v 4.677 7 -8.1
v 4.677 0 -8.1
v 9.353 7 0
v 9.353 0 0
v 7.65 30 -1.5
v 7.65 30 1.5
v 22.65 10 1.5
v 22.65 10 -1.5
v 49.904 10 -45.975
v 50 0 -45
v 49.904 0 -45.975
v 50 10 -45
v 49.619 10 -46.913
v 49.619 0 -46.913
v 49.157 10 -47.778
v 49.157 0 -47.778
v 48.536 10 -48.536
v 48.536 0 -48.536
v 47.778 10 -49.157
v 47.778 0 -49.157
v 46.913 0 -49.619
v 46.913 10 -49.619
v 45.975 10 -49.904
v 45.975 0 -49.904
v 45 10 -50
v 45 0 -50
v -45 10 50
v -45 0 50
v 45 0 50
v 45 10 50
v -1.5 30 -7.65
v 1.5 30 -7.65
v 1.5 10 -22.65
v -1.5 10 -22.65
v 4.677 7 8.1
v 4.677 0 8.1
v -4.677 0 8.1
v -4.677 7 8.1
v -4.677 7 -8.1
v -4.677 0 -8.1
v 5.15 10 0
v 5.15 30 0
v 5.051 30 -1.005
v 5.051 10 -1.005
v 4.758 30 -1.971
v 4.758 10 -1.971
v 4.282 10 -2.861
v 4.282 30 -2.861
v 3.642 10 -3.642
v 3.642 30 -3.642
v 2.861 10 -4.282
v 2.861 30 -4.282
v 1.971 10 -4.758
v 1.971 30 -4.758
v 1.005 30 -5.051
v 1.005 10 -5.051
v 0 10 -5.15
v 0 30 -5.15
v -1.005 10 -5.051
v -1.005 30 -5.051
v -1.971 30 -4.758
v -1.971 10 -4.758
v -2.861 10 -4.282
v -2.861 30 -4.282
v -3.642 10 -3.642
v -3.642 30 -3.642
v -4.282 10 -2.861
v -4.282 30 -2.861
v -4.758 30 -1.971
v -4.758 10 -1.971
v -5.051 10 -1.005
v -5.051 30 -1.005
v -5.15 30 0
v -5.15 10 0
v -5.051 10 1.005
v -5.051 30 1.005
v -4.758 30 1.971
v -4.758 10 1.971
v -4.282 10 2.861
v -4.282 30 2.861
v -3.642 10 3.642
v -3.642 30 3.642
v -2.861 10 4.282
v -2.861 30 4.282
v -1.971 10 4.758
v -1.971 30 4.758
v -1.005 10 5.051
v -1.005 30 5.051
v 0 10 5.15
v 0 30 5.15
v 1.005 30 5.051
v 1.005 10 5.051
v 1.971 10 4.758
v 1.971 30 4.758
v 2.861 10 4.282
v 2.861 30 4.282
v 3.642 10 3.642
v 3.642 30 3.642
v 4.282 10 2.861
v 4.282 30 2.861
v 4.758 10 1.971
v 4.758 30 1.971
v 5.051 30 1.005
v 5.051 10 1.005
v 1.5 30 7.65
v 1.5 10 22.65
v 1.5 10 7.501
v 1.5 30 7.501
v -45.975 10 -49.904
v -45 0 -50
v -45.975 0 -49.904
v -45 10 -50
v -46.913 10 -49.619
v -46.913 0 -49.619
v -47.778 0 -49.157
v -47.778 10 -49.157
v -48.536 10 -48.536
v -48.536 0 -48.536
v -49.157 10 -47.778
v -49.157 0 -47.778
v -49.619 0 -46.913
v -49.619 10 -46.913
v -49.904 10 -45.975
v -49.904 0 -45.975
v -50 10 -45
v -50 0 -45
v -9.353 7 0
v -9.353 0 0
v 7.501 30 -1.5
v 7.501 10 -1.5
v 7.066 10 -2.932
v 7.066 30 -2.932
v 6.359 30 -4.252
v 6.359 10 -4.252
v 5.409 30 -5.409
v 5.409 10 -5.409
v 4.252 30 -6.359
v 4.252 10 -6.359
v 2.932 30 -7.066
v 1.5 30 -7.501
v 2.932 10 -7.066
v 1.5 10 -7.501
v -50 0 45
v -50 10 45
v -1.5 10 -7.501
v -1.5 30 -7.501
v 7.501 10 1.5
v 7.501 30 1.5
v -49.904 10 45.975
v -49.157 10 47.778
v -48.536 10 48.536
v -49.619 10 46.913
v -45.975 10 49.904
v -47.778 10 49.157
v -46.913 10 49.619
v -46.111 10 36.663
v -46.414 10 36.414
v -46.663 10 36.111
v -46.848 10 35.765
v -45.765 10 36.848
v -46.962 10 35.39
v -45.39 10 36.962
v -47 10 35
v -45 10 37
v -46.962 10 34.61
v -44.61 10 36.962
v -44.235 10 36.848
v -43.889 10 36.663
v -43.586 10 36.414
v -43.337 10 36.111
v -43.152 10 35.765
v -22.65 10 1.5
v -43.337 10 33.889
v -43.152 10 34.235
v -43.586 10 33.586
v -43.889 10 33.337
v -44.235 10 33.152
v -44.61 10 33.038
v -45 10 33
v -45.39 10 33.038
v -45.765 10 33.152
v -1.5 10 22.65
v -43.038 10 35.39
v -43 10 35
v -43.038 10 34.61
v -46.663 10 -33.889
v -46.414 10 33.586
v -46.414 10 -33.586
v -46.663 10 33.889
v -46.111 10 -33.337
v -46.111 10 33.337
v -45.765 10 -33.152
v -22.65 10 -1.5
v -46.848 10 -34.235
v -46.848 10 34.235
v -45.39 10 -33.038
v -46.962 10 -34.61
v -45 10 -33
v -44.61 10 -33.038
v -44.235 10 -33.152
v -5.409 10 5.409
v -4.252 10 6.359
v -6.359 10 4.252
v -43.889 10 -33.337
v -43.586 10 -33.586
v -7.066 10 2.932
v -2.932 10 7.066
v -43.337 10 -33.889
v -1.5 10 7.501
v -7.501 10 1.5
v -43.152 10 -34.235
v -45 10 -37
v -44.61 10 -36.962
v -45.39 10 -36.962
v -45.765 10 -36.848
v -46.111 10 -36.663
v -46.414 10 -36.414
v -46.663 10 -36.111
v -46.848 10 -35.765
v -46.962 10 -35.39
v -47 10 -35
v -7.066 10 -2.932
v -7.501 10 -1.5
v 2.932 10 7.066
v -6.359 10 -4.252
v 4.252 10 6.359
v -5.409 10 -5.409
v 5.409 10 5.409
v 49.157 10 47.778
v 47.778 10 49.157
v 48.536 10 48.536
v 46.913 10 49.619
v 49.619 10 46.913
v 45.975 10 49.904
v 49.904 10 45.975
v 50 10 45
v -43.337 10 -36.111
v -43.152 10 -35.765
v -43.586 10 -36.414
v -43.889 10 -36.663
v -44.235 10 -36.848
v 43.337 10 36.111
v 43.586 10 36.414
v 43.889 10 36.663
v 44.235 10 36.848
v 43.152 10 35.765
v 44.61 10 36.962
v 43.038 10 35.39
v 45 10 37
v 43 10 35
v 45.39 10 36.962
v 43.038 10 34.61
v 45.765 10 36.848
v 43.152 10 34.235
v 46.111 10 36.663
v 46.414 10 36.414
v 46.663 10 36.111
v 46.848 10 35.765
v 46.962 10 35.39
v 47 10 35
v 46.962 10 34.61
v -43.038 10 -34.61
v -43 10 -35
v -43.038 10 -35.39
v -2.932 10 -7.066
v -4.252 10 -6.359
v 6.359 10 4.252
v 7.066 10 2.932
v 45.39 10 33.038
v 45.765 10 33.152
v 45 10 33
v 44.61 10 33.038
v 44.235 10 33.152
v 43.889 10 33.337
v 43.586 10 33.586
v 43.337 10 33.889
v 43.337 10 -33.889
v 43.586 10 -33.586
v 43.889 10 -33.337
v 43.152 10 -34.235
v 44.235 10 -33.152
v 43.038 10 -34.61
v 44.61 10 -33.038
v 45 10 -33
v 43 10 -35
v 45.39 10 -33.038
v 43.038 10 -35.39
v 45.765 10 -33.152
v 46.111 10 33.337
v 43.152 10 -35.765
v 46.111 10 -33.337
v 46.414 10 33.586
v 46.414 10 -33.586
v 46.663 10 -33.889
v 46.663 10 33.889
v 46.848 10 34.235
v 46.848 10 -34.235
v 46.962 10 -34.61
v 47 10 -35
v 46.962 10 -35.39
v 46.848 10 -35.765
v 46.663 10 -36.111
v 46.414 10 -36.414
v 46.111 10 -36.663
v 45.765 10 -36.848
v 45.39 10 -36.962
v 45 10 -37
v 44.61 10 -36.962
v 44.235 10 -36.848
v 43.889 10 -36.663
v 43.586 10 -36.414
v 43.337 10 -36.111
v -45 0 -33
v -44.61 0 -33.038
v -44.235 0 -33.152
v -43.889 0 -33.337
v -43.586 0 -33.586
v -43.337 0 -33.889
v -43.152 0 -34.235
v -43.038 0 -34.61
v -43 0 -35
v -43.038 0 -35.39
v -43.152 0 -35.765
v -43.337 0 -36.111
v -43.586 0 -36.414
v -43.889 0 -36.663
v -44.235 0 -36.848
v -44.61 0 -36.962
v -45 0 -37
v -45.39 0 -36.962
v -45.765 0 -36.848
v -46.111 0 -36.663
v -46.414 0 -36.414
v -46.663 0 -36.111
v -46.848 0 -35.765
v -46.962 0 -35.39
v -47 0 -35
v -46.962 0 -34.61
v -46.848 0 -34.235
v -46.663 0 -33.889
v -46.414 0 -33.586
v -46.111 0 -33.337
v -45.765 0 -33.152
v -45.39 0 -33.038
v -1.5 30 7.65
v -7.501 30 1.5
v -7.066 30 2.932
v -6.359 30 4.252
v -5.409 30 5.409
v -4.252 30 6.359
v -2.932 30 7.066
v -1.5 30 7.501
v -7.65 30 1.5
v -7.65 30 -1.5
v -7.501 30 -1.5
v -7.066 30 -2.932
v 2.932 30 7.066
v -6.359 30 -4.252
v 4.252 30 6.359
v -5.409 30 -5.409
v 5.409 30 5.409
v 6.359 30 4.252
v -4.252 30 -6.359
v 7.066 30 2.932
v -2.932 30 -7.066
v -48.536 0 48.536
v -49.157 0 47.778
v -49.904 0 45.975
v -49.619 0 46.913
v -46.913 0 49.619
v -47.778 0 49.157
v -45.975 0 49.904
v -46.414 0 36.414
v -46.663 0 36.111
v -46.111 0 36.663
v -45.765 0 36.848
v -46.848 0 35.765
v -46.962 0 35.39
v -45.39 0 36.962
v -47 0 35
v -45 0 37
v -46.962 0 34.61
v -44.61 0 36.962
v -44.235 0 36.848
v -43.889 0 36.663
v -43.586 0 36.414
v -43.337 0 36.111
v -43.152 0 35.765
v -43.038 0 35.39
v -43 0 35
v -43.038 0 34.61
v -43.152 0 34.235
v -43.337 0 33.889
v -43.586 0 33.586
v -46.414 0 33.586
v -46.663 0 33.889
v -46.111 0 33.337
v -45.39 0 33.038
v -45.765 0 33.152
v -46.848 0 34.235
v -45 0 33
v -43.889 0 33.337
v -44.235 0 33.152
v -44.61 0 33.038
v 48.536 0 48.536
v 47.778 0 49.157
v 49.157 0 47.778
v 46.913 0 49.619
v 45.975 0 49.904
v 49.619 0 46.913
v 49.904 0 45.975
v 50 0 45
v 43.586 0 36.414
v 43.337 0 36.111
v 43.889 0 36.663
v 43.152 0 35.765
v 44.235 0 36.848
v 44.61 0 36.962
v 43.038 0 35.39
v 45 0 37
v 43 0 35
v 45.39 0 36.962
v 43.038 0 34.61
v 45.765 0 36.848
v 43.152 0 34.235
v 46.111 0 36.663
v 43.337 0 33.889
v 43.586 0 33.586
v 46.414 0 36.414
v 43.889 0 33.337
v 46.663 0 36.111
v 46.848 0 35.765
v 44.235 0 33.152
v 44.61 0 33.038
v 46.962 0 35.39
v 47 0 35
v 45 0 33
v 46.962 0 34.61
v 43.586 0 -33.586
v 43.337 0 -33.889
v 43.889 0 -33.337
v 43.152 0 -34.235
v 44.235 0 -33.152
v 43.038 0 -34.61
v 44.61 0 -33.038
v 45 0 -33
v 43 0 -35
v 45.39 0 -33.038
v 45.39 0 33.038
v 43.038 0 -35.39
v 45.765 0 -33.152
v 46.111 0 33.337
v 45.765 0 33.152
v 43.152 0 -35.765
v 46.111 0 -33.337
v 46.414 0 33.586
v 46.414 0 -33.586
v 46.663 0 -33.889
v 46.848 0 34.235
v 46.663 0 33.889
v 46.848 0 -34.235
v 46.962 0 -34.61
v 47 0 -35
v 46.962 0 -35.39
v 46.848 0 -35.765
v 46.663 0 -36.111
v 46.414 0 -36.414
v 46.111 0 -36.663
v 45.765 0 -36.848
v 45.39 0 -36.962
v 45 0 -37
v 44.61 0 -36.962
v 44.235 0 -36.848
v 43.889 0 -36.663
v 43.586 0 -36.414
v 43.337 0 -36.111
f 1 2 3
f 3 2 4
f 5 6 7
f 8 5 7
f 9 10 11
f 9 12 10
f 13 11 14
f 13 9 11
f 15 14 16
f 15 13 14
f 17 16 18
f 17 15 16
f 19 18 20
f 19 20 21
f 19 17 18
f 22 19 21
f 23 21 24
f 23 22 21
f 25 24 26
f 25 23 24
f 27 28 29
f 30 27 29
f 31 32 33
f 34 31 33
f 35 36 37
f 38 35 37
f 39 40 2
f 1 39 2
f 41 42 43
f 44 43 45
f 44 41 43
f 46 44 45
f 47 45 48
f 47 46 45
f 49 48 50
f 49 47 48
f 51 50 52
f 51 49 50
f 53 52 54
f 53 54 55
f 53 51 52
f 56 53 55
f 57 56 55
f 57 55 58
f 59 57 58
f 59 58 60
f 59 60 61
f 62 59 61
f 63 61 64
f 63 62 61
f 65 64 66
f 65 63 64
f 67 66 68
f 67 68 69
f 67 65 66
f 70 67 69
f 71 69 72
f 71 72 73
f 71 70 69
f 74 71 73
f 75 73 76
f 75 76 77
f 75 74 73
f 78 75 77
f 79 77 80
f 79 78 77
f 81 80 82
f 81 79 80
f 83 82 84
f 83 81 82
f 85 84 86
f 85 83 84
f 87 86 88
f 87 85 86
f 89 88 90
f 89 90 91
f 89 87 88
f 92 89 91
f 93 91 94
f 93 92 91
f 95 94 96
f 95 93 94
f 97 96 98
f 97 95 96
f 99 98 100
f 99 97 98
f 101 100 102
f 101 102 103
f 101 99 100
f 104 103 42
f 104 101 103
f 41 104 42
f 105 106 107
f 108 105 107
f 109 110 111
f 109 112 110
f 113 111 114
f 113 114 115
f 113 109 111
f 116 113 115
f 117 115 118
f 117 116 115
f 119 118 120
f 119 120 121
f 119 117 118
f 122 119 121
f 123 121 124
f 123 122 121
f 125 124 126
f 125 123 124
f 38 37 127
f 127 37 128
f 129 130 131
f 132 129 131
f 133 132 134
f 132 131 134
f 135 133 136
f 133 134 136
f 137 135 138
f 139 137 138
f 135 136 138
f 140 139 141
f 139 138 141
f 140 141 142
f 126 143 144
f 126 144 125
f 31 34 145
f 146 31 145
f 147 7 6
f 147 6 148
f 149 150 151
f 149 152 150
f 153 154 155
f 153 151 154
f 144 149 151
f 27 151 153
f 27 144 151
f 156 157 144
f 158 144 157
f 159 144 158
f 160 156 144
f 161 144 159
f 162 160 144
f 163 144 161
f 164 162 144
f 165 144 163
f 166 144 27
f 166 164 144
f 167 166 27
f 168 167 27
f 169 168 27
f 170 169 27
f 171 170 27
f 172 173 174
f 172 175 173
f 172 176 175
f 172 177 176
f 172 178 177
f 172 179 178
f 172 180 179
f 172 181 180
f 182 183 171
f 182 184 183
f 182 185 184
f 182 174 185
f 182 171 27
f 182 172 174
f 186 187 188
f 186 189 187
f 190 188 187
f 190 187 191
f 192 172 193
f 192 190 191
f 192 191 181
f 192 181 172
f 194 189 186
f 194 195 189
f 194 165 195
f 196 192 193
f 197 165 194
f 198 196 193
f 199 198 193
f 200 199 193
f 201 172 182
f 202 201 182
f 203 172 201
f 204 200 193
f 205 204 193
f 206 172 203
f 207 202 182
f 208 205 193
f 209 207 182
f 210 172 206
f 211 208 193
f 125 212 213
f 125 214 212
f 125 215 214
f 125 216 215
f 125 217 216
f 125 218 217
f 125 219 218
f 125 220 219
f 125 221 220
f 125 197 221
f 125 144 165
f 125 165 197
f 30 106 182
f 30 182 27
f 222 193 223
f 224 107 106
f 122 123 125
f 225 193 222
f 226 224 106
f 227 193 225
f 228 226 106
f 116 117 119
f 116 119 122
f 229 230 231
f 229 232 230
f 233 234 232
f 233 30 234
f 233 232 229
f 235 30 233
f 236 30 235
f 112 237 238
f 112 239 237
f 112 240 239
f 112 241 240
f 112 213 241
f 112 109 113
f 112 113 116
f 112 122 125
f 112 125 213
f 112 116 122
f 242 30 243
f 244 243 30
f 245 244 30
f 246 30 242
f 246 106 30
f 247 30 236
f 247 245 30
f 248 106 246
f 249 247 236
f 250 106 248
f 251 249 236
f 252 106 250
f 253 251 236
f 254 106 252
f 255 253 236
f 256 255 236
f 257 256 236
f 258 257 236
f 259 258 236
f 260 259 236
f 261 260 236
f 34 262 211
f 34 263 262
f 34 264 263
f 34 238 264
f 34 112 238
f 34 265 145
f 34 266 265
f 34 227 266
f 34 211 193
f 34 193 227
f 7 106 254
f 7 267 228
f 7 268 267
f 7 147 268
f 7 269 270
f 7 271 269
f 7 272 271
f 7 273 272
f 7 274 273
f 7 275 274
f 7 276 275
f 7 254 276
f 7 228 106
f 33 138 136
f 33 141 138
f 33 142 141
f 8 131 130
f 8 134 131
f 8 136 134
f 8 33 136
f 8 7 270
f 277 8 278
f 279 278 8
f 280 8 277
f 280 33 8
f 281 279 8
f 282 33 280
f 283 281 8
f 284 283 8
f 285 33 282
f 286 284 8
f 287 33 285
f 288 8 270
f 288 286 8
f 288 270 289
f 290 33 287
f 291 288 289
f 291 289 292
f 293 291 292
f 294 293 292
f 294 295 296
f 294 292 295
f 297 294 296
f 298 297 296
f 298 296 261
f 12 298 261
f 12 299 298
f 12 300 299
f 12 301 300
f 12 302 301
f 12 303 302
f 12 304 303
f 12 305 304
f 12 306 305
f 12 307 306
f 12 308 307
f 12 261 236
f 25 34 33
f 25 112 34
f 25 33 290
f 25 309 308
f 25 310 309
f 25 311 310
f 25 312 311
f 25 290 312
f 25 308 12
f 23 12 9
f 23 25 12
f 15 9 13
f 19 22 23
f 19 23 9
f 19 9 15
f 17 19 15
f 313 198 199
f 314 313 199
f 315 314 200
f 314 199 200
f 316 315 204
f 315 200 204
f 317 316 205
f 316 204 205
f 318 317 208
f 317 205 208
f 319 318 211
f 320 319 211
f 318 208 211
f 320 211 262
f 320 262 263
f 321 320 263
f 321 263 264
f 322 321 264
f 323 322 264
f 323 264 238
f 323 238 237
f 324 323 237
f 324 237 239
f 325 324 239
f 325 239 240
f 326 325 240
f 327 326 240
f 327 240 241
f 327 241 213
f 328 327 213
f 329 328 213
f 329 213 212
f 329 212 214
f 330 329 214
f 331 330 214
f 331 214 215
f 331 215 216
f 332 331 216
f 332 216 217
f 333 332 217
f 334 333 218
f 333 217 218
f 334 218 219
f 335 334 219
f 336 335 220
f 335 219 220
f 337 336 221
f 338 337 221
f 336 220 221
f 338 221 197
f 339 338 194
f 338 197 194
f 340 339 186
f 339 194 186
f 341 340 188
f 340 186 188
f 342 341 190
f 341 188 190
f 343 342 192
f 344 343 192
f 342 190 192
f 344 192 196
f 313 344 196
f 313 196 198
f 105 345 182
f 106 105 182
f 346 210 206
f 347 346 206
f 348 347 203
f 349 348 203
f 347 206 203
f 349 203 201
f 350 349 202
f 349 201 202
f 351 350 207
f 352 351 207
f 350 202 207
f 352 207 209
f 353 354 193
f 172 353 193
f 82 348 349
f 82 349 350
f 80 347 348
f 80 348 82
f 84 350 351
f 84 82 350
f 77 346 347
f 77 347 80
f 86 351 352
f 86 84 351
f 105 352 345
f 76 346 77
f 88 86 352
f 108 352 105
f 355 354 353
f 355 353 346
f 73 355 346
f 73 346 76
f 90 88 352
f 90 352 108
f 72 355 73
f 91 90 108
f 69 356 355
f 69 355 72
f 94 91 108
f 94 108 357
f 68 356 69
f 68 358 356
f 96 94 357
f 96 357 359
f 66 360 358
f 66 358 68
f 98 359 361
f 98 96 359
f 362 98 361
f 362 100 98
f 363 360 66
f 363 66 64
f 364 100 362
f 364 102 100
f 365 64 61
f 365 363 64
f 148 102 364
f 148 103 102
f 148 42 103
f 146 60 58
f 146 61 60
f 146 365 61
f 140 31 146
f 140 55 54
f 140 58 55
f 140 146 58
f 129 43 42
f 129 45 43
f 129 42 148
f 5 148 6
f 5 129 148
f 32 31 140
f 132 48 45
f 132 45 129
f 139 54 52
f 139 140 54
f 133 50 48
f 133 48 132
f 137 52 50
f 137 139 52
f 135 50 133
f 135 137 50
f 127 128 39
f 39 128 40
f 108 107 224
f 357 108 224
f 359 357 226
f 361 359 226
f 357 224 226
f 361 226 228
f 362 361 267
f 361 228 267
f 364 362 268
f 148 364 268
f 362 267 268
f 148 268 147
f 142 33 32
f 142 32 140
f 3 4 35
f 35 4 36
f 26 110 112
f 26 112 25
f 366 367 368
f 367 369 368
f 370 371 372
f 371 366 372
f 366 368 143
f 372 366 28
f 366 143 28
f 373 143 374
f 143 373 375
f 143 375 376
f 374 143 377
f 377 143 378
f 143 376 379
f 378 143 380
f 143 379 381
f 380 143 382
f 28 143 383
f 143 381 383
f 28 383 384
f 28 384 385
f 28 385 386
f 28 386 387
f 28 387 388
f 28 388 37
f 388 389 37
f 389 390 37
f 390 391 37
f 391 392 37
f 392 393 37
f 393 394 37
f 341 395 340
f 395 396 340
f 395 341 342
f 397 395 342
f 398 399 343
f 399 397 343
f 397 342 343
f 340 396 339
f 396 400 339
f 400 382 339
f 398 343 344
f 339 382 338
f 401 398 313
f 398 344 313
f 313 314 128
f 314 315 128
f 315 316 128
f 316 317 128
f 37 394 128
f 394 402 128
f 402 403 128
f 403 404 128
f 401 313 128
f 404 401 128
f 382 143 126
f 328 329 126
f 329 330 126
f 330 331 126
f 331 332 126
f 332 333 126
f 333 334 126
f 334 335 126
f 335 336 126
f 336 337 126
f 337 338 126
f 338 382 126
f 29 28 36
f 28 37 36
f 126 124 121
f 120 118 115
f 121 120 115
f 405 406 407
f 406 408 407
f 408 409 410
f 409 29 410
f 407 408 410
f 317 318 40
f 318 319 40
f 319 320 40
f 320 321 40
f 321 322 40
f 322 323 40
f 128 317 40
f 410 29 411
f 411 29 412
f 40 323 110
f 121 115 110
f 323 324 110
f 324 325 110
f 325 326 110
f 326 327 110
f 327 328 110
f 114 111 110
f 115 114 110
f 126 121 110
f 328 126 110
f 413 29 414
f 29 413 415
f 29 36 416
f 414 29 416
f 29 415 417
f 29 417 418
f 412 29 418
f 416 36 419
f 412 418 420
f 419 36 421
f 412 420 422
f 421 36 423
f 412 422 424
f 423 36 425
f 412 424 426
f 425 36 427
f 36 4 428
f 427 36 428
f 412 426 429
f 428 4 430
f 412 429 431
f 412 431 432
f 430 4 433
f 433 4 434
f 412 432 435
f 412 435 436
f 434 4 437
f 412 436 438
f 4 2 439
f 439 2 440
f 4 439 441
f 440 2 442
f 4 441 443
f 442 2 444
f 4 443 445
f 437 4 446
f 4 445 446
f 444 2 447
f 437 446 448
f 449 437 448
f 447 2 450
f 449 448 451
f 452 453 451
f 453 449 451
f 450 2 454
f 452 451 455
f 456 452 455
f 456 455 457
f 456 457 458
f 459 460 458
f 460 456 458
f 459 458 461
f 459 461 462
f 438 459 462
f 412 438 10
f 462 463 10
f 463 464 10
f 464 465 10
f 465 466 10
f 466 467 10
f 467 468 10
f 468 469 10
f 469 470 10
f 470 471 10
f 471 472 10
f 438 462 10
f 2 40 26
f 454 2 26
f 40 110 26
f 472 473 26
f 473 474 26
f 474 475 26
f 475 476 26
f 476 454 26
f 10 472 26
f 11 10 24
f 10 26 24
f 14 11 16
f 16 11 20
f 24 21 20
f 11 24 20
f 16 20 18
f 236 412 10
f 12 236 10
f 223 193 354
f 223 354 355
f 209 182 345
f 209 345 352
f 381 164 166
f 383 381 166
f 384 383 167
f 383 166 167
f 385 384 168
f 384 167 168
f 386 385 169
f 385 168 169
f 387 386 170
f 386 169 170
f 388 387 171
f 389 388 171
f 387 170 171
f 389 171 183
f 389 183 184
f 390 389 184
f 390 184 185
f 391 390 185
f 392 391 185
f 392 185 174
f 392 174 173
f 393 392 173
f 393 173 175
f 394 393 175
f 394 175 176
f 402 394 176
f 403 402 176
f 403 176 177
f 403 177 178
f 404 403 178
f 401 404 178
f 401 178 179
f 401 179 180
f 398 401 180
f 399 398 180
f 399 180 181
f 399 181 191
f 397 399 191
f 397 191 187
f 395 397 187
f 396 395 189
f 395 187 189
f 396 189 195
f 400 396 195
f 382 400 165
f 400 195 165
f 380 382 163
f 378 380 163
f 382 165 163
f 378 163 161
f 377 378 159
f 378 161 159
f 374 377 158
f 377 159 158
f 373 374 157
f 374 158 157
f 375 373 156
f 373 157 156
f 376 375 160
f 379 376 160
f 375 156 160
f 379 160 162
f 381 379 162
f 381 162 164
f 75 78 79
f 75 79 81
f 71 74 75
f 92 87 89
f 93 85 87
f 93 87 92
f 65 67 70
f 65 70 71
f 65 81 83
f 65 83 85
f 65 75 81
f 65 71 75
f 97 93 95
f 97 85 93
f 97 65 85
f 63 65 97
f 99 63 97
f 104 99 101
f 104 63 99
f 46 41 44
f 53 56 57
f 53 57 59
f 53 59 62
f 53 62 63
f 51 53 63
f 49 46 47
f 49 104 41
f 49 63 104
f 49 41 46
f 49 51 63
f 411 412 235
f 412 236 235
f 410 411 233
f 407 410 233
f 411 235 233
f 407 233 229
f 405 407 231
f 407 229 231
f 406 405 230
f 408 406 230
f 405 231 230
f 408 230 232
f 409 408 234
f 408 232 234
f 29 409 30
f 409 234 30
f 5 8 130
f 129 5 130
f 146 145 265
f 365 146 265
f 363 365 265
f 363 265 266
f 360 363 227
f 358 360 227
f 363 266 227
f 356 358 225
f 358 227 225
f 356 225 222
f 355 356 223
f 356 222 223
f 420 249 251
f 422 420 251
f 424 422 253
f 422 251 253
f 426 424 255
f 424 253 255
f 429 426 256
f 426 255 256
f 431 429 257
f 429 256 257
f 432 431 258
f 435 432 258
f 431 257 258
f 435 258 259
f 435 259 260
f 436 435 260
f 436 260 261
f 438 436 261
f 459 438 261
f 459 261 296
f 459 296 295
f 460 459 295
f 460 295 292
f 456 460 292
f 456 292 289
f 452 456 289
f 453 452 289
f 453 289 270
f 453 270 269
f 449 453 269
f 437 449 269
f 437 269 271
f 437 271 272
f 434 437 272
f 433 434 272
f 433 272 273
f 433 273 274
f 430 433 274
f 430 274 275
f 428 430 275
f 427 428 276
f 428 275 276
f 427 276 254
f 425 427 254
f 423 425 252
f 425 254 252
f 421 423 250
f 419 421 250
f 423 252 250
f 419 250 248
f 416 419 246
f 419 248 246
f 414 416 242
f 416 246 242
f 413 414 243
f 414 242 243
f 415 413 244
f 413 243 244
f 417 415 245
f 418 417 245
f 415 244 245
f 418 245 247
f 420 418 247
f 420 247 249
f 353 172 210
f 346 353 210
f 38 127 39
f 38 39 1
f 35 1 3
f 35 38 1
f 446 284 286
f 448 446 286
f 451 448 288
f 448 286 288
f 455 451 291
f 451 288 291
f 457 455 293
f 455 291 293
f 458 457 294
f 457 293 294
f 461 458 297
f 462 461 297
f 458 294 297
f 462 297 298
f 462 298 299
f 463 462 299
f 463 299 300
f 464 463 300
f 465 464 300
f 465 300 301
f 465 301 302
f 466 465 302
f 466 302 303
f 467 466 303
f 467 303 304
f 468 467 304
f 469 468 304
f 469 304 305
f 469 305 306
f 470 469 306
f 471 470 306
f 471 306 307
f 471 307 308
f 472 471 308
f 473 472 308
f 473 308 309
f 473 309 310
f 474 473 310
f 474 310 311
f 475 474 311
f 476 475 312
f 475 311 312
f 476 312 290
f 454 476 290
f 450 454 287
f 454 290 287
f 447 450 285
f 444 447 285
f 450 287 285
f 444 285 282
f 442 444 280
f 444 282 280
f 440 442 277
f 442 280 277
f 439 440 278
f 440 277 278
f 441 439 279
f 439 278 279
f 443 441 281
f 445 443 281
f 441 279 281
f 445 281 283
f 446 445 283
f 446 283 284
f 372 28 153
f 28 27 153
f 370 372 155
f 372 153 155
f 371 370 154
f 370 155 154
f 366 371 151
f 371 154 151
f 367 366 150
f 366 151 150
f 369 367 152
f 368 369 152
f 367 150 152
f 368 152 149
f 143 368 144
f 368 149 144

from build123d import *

# Parameters (mm, degrees)
SKETCH1_W           = 100
SKETCH1_H           = 100
BOSS_EXTRUDE1_DEPTH = 10
SKETCH2_R           = 2
CUT_EXTRUDE1_DEPTH  = 72.414284285
SKETCH3_R           = 7.65
SKETCH3_R_2         = 5.15
EXTRUDE_THIN1_DEPTH = 20
RIB1_START          = -1.5
RIB1_DEPTH          = 3
CIRPATTERN1_COUNT   = 4
FILLET1_R           = 5
CUT_EXTRUDE3_DEPTH  = 7


with BuildPart() as part:
    # Sketch1 → Boss-Extrude1 (new body)
    with BuildSketch(Plane(origin=(0, 0, 0), x_dir=(1, 0, 0), z_dir=(0, 1, 0))):
        Rectangle(SKETCH1_W, SKETCH1_H)
    extrude(amount=BOSS_EXTRUDE1_DEPTH)

    # Sketch2 → Cut-Extrude1 (cut, through all)
    with BuildSketch(Plane(origin=(0, 10, 0), x_dir=(1, 0, 0), z_dir=(0, 1, 0))):
        with Locations(Location((-45, 35, 0), (0, 0, 270))):
            Circle(SKETCH2_R)
        with Locations(Location((45, 35, 0), (0, 0, 270))):
            Circle(SKETCH2_R)
        with Locations(Location((45, -35, 0), (0, 0, 270))):
            Circle(SKETCH2_R)
        with Locations(Location((-45, -35, 0), (0, 0, 270))):
            Circle(SKETCH2_R)
    extrude(amount=-CUT_EXTRUDE1_DEPTH, mode=Mode.SUBTRACT)

    # Sketch3 → Extrude-Thin1 (add)
    with BuildSketch(Plane(origin=(0, 10, 0), x_dir=(1, 0, 0), z_dir=(0, 1, 0))):
        Circle(SKETCH3_R)
        Circle(SKETCH3_R_2, mode=Mode.SUBTRACT)
    extrude(amount=EXTRUDE_THIN1_DEPTH)

    # Rib1: read off the stored shape, not the designer's step
    # Rib1 outline → Rib1 (add)
    with BuildSketch(Plane.XY.offset(RIB1_START)):
        Polygon((-7.50149985, 30), (-7.65, 30), (-22.65, 10), (-7.50149985, 10), align=None)
    rib1 = extrude(amount=RIB1_DEPTH)

    # CirPattern1: Rib1 ×4 about axis
    cirpattern1_axis = Axis((0, 0, 0), (0, 1, 0))
    for i in range(1, CIRPATTERN1_COUNT):
        add(rib1.rotate(cirpattern1_axis, i * 360 / CIRPATTERN1_COUNT))

    # Fillet1
    fillet1_edges = [part.edges().sort_by_distance(p)[0] for p in [
        (50, 5, 50),
        (-50, 5, 50),
        (-50, 5, -50),
        (50, 5, -50),
    ]]
    fillet(fillet1_edges, radius=FILLET1_R)

    # Sketch6 → Cut-Extrude3 (cut)
    with BuildSketch(Plane.XZ):
        Polygon((4.67653718, -8.1), (9.353074361, 0), (4.67653718, 8.1), (-4.67653718, 8.1), (-9.353074361, 0), (-4.67653718, -8.1), align=None)
    extrude(amount=-CUT_EXTRUDE3_DEPTH, mode=Mode.SUBTRACT)


solid = part.part
